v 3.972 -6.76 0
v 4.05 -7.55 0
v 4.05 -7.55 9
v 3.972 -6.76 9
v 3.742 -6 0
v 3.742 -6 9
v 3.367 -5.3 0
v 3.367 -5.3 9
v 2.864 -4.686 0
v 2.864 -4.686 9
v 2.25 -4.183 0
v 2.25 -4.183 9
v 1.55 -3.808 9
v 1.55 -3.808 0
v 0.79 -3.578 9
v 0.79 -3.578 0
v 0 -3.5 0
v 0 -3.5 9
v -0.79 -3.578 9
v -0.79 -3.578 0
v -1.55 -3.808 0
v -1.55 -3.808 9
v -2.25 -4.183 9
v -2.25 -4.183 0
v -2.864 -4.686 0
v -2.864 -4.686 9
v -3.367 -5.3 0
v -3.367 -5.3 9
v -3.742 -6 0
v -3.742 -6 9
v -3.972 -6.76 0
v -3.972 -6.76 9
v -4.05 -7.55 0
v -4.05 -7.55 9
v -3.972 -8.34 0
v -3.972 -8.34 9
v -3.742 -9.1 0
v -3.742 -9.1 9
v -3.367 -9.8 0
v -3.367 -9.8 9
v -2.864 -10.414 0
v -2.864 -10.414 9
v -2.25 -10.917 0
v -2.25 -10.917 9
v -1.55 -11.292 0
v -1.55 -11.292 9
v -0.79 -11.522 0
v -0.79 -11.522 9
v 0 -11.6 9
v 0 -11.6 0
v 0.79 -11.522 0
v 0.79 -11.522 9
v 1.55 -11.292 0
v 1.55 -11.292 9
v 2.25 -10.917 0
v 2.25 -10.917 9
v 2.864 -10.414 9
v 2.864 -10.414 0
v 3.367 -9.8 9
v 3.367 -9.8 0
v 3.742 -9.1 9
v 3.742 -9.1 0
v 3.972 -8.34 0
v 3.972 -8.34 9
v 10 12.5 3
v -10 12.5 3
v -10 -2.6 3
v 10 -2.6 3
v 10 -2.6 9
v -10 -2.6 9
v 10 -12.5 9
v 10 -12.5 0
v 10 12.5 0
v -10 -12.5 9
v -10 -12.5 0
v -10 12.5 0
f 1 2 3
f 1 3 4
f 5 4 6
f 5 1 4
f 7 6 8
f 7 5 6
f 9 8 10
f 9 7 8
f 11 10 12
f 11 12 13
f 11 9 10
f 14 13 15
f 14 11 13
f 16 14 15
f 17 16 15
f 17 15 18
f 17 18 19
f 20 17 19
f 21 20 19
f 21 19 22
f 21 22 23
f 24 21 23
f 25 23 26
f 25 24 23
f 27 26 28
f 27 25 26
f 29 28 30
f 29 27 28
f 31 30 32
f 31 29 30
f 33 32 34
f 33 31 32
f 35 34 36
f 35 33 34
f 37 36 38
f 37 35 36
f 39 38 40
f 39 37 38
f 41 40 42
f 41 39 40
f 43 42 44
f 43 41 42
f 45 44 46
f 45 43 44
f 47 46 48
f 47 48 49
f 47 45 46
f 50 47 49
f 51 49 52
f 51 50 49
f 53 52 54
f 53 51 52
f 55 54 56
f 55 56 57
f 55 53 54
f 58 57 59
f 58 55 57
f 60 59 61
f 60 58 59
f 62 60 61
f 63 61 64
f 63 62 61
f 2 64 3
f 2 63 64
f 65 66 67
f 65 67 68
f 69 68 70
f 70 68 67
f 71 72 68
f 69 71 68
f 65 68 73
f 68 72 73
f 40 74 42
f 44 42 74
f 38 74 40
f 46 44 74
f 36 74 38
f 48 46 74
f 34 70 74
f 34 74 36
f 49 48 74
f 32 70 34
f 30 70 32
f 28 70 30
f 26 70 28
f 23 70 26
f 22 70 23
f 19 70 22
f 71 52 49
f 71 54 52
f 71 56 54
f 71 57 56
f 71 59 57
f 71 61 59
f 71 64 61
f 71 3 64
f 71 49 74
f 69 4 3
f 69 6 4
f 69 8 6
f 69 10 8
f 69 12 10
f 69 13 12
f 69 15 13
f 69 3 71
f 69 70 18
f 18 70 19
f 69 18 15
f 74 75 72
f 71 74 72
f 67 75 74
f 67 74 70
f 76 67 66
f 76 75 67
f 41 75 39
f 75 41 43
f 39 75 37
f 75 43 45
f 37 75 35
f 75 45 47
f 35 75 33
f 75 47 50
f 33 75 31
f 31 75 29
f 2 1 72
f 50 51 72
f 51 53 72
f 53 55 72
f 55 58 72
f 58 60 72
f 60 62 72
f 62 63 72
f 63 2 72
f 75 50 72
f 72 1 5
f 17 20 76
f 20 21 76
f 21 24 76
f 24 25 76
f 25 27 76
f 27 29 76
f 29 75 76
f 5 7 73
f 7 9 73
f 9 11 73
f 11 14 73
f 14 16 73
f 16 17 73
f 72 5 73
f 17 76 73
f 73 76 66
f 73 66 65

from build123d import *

# Parameters (mm, degrees)
F0_W     = 20
F0_H     = 25
F1_DEPTH = 3
F3_DEPTH = 9
F4_R     = 4.05
F5_DEPTH = 9


with BuildPart() as f1:
    # F0 (on Top) → F1 (new body)
    with BuildSketch(Plane.XY):
        Rectangle(F0_W, F0_H)
    extrude(amount=F1_DEPTH)

    # F2 (on Top) → F3 (join)
    with BuildSketch(Plane.XY):
        Polygon((10, -2.6), (-10, -2.6), (-10, -6.8), (-10, -12.5), (10, -12.5), (10, -7.5), align=None)
    extrude(amount=F3_DEPTH)

    # F4 (on Top) → F5 (cut, through all)
    with BuildSketch(Plane.XY):
        with Locations((0, -7.55)):
            Circle(F4_R)
    extrude(amount=F5_DEPTH, mode=Mode.SUBTRACT)


solid = f1.part
